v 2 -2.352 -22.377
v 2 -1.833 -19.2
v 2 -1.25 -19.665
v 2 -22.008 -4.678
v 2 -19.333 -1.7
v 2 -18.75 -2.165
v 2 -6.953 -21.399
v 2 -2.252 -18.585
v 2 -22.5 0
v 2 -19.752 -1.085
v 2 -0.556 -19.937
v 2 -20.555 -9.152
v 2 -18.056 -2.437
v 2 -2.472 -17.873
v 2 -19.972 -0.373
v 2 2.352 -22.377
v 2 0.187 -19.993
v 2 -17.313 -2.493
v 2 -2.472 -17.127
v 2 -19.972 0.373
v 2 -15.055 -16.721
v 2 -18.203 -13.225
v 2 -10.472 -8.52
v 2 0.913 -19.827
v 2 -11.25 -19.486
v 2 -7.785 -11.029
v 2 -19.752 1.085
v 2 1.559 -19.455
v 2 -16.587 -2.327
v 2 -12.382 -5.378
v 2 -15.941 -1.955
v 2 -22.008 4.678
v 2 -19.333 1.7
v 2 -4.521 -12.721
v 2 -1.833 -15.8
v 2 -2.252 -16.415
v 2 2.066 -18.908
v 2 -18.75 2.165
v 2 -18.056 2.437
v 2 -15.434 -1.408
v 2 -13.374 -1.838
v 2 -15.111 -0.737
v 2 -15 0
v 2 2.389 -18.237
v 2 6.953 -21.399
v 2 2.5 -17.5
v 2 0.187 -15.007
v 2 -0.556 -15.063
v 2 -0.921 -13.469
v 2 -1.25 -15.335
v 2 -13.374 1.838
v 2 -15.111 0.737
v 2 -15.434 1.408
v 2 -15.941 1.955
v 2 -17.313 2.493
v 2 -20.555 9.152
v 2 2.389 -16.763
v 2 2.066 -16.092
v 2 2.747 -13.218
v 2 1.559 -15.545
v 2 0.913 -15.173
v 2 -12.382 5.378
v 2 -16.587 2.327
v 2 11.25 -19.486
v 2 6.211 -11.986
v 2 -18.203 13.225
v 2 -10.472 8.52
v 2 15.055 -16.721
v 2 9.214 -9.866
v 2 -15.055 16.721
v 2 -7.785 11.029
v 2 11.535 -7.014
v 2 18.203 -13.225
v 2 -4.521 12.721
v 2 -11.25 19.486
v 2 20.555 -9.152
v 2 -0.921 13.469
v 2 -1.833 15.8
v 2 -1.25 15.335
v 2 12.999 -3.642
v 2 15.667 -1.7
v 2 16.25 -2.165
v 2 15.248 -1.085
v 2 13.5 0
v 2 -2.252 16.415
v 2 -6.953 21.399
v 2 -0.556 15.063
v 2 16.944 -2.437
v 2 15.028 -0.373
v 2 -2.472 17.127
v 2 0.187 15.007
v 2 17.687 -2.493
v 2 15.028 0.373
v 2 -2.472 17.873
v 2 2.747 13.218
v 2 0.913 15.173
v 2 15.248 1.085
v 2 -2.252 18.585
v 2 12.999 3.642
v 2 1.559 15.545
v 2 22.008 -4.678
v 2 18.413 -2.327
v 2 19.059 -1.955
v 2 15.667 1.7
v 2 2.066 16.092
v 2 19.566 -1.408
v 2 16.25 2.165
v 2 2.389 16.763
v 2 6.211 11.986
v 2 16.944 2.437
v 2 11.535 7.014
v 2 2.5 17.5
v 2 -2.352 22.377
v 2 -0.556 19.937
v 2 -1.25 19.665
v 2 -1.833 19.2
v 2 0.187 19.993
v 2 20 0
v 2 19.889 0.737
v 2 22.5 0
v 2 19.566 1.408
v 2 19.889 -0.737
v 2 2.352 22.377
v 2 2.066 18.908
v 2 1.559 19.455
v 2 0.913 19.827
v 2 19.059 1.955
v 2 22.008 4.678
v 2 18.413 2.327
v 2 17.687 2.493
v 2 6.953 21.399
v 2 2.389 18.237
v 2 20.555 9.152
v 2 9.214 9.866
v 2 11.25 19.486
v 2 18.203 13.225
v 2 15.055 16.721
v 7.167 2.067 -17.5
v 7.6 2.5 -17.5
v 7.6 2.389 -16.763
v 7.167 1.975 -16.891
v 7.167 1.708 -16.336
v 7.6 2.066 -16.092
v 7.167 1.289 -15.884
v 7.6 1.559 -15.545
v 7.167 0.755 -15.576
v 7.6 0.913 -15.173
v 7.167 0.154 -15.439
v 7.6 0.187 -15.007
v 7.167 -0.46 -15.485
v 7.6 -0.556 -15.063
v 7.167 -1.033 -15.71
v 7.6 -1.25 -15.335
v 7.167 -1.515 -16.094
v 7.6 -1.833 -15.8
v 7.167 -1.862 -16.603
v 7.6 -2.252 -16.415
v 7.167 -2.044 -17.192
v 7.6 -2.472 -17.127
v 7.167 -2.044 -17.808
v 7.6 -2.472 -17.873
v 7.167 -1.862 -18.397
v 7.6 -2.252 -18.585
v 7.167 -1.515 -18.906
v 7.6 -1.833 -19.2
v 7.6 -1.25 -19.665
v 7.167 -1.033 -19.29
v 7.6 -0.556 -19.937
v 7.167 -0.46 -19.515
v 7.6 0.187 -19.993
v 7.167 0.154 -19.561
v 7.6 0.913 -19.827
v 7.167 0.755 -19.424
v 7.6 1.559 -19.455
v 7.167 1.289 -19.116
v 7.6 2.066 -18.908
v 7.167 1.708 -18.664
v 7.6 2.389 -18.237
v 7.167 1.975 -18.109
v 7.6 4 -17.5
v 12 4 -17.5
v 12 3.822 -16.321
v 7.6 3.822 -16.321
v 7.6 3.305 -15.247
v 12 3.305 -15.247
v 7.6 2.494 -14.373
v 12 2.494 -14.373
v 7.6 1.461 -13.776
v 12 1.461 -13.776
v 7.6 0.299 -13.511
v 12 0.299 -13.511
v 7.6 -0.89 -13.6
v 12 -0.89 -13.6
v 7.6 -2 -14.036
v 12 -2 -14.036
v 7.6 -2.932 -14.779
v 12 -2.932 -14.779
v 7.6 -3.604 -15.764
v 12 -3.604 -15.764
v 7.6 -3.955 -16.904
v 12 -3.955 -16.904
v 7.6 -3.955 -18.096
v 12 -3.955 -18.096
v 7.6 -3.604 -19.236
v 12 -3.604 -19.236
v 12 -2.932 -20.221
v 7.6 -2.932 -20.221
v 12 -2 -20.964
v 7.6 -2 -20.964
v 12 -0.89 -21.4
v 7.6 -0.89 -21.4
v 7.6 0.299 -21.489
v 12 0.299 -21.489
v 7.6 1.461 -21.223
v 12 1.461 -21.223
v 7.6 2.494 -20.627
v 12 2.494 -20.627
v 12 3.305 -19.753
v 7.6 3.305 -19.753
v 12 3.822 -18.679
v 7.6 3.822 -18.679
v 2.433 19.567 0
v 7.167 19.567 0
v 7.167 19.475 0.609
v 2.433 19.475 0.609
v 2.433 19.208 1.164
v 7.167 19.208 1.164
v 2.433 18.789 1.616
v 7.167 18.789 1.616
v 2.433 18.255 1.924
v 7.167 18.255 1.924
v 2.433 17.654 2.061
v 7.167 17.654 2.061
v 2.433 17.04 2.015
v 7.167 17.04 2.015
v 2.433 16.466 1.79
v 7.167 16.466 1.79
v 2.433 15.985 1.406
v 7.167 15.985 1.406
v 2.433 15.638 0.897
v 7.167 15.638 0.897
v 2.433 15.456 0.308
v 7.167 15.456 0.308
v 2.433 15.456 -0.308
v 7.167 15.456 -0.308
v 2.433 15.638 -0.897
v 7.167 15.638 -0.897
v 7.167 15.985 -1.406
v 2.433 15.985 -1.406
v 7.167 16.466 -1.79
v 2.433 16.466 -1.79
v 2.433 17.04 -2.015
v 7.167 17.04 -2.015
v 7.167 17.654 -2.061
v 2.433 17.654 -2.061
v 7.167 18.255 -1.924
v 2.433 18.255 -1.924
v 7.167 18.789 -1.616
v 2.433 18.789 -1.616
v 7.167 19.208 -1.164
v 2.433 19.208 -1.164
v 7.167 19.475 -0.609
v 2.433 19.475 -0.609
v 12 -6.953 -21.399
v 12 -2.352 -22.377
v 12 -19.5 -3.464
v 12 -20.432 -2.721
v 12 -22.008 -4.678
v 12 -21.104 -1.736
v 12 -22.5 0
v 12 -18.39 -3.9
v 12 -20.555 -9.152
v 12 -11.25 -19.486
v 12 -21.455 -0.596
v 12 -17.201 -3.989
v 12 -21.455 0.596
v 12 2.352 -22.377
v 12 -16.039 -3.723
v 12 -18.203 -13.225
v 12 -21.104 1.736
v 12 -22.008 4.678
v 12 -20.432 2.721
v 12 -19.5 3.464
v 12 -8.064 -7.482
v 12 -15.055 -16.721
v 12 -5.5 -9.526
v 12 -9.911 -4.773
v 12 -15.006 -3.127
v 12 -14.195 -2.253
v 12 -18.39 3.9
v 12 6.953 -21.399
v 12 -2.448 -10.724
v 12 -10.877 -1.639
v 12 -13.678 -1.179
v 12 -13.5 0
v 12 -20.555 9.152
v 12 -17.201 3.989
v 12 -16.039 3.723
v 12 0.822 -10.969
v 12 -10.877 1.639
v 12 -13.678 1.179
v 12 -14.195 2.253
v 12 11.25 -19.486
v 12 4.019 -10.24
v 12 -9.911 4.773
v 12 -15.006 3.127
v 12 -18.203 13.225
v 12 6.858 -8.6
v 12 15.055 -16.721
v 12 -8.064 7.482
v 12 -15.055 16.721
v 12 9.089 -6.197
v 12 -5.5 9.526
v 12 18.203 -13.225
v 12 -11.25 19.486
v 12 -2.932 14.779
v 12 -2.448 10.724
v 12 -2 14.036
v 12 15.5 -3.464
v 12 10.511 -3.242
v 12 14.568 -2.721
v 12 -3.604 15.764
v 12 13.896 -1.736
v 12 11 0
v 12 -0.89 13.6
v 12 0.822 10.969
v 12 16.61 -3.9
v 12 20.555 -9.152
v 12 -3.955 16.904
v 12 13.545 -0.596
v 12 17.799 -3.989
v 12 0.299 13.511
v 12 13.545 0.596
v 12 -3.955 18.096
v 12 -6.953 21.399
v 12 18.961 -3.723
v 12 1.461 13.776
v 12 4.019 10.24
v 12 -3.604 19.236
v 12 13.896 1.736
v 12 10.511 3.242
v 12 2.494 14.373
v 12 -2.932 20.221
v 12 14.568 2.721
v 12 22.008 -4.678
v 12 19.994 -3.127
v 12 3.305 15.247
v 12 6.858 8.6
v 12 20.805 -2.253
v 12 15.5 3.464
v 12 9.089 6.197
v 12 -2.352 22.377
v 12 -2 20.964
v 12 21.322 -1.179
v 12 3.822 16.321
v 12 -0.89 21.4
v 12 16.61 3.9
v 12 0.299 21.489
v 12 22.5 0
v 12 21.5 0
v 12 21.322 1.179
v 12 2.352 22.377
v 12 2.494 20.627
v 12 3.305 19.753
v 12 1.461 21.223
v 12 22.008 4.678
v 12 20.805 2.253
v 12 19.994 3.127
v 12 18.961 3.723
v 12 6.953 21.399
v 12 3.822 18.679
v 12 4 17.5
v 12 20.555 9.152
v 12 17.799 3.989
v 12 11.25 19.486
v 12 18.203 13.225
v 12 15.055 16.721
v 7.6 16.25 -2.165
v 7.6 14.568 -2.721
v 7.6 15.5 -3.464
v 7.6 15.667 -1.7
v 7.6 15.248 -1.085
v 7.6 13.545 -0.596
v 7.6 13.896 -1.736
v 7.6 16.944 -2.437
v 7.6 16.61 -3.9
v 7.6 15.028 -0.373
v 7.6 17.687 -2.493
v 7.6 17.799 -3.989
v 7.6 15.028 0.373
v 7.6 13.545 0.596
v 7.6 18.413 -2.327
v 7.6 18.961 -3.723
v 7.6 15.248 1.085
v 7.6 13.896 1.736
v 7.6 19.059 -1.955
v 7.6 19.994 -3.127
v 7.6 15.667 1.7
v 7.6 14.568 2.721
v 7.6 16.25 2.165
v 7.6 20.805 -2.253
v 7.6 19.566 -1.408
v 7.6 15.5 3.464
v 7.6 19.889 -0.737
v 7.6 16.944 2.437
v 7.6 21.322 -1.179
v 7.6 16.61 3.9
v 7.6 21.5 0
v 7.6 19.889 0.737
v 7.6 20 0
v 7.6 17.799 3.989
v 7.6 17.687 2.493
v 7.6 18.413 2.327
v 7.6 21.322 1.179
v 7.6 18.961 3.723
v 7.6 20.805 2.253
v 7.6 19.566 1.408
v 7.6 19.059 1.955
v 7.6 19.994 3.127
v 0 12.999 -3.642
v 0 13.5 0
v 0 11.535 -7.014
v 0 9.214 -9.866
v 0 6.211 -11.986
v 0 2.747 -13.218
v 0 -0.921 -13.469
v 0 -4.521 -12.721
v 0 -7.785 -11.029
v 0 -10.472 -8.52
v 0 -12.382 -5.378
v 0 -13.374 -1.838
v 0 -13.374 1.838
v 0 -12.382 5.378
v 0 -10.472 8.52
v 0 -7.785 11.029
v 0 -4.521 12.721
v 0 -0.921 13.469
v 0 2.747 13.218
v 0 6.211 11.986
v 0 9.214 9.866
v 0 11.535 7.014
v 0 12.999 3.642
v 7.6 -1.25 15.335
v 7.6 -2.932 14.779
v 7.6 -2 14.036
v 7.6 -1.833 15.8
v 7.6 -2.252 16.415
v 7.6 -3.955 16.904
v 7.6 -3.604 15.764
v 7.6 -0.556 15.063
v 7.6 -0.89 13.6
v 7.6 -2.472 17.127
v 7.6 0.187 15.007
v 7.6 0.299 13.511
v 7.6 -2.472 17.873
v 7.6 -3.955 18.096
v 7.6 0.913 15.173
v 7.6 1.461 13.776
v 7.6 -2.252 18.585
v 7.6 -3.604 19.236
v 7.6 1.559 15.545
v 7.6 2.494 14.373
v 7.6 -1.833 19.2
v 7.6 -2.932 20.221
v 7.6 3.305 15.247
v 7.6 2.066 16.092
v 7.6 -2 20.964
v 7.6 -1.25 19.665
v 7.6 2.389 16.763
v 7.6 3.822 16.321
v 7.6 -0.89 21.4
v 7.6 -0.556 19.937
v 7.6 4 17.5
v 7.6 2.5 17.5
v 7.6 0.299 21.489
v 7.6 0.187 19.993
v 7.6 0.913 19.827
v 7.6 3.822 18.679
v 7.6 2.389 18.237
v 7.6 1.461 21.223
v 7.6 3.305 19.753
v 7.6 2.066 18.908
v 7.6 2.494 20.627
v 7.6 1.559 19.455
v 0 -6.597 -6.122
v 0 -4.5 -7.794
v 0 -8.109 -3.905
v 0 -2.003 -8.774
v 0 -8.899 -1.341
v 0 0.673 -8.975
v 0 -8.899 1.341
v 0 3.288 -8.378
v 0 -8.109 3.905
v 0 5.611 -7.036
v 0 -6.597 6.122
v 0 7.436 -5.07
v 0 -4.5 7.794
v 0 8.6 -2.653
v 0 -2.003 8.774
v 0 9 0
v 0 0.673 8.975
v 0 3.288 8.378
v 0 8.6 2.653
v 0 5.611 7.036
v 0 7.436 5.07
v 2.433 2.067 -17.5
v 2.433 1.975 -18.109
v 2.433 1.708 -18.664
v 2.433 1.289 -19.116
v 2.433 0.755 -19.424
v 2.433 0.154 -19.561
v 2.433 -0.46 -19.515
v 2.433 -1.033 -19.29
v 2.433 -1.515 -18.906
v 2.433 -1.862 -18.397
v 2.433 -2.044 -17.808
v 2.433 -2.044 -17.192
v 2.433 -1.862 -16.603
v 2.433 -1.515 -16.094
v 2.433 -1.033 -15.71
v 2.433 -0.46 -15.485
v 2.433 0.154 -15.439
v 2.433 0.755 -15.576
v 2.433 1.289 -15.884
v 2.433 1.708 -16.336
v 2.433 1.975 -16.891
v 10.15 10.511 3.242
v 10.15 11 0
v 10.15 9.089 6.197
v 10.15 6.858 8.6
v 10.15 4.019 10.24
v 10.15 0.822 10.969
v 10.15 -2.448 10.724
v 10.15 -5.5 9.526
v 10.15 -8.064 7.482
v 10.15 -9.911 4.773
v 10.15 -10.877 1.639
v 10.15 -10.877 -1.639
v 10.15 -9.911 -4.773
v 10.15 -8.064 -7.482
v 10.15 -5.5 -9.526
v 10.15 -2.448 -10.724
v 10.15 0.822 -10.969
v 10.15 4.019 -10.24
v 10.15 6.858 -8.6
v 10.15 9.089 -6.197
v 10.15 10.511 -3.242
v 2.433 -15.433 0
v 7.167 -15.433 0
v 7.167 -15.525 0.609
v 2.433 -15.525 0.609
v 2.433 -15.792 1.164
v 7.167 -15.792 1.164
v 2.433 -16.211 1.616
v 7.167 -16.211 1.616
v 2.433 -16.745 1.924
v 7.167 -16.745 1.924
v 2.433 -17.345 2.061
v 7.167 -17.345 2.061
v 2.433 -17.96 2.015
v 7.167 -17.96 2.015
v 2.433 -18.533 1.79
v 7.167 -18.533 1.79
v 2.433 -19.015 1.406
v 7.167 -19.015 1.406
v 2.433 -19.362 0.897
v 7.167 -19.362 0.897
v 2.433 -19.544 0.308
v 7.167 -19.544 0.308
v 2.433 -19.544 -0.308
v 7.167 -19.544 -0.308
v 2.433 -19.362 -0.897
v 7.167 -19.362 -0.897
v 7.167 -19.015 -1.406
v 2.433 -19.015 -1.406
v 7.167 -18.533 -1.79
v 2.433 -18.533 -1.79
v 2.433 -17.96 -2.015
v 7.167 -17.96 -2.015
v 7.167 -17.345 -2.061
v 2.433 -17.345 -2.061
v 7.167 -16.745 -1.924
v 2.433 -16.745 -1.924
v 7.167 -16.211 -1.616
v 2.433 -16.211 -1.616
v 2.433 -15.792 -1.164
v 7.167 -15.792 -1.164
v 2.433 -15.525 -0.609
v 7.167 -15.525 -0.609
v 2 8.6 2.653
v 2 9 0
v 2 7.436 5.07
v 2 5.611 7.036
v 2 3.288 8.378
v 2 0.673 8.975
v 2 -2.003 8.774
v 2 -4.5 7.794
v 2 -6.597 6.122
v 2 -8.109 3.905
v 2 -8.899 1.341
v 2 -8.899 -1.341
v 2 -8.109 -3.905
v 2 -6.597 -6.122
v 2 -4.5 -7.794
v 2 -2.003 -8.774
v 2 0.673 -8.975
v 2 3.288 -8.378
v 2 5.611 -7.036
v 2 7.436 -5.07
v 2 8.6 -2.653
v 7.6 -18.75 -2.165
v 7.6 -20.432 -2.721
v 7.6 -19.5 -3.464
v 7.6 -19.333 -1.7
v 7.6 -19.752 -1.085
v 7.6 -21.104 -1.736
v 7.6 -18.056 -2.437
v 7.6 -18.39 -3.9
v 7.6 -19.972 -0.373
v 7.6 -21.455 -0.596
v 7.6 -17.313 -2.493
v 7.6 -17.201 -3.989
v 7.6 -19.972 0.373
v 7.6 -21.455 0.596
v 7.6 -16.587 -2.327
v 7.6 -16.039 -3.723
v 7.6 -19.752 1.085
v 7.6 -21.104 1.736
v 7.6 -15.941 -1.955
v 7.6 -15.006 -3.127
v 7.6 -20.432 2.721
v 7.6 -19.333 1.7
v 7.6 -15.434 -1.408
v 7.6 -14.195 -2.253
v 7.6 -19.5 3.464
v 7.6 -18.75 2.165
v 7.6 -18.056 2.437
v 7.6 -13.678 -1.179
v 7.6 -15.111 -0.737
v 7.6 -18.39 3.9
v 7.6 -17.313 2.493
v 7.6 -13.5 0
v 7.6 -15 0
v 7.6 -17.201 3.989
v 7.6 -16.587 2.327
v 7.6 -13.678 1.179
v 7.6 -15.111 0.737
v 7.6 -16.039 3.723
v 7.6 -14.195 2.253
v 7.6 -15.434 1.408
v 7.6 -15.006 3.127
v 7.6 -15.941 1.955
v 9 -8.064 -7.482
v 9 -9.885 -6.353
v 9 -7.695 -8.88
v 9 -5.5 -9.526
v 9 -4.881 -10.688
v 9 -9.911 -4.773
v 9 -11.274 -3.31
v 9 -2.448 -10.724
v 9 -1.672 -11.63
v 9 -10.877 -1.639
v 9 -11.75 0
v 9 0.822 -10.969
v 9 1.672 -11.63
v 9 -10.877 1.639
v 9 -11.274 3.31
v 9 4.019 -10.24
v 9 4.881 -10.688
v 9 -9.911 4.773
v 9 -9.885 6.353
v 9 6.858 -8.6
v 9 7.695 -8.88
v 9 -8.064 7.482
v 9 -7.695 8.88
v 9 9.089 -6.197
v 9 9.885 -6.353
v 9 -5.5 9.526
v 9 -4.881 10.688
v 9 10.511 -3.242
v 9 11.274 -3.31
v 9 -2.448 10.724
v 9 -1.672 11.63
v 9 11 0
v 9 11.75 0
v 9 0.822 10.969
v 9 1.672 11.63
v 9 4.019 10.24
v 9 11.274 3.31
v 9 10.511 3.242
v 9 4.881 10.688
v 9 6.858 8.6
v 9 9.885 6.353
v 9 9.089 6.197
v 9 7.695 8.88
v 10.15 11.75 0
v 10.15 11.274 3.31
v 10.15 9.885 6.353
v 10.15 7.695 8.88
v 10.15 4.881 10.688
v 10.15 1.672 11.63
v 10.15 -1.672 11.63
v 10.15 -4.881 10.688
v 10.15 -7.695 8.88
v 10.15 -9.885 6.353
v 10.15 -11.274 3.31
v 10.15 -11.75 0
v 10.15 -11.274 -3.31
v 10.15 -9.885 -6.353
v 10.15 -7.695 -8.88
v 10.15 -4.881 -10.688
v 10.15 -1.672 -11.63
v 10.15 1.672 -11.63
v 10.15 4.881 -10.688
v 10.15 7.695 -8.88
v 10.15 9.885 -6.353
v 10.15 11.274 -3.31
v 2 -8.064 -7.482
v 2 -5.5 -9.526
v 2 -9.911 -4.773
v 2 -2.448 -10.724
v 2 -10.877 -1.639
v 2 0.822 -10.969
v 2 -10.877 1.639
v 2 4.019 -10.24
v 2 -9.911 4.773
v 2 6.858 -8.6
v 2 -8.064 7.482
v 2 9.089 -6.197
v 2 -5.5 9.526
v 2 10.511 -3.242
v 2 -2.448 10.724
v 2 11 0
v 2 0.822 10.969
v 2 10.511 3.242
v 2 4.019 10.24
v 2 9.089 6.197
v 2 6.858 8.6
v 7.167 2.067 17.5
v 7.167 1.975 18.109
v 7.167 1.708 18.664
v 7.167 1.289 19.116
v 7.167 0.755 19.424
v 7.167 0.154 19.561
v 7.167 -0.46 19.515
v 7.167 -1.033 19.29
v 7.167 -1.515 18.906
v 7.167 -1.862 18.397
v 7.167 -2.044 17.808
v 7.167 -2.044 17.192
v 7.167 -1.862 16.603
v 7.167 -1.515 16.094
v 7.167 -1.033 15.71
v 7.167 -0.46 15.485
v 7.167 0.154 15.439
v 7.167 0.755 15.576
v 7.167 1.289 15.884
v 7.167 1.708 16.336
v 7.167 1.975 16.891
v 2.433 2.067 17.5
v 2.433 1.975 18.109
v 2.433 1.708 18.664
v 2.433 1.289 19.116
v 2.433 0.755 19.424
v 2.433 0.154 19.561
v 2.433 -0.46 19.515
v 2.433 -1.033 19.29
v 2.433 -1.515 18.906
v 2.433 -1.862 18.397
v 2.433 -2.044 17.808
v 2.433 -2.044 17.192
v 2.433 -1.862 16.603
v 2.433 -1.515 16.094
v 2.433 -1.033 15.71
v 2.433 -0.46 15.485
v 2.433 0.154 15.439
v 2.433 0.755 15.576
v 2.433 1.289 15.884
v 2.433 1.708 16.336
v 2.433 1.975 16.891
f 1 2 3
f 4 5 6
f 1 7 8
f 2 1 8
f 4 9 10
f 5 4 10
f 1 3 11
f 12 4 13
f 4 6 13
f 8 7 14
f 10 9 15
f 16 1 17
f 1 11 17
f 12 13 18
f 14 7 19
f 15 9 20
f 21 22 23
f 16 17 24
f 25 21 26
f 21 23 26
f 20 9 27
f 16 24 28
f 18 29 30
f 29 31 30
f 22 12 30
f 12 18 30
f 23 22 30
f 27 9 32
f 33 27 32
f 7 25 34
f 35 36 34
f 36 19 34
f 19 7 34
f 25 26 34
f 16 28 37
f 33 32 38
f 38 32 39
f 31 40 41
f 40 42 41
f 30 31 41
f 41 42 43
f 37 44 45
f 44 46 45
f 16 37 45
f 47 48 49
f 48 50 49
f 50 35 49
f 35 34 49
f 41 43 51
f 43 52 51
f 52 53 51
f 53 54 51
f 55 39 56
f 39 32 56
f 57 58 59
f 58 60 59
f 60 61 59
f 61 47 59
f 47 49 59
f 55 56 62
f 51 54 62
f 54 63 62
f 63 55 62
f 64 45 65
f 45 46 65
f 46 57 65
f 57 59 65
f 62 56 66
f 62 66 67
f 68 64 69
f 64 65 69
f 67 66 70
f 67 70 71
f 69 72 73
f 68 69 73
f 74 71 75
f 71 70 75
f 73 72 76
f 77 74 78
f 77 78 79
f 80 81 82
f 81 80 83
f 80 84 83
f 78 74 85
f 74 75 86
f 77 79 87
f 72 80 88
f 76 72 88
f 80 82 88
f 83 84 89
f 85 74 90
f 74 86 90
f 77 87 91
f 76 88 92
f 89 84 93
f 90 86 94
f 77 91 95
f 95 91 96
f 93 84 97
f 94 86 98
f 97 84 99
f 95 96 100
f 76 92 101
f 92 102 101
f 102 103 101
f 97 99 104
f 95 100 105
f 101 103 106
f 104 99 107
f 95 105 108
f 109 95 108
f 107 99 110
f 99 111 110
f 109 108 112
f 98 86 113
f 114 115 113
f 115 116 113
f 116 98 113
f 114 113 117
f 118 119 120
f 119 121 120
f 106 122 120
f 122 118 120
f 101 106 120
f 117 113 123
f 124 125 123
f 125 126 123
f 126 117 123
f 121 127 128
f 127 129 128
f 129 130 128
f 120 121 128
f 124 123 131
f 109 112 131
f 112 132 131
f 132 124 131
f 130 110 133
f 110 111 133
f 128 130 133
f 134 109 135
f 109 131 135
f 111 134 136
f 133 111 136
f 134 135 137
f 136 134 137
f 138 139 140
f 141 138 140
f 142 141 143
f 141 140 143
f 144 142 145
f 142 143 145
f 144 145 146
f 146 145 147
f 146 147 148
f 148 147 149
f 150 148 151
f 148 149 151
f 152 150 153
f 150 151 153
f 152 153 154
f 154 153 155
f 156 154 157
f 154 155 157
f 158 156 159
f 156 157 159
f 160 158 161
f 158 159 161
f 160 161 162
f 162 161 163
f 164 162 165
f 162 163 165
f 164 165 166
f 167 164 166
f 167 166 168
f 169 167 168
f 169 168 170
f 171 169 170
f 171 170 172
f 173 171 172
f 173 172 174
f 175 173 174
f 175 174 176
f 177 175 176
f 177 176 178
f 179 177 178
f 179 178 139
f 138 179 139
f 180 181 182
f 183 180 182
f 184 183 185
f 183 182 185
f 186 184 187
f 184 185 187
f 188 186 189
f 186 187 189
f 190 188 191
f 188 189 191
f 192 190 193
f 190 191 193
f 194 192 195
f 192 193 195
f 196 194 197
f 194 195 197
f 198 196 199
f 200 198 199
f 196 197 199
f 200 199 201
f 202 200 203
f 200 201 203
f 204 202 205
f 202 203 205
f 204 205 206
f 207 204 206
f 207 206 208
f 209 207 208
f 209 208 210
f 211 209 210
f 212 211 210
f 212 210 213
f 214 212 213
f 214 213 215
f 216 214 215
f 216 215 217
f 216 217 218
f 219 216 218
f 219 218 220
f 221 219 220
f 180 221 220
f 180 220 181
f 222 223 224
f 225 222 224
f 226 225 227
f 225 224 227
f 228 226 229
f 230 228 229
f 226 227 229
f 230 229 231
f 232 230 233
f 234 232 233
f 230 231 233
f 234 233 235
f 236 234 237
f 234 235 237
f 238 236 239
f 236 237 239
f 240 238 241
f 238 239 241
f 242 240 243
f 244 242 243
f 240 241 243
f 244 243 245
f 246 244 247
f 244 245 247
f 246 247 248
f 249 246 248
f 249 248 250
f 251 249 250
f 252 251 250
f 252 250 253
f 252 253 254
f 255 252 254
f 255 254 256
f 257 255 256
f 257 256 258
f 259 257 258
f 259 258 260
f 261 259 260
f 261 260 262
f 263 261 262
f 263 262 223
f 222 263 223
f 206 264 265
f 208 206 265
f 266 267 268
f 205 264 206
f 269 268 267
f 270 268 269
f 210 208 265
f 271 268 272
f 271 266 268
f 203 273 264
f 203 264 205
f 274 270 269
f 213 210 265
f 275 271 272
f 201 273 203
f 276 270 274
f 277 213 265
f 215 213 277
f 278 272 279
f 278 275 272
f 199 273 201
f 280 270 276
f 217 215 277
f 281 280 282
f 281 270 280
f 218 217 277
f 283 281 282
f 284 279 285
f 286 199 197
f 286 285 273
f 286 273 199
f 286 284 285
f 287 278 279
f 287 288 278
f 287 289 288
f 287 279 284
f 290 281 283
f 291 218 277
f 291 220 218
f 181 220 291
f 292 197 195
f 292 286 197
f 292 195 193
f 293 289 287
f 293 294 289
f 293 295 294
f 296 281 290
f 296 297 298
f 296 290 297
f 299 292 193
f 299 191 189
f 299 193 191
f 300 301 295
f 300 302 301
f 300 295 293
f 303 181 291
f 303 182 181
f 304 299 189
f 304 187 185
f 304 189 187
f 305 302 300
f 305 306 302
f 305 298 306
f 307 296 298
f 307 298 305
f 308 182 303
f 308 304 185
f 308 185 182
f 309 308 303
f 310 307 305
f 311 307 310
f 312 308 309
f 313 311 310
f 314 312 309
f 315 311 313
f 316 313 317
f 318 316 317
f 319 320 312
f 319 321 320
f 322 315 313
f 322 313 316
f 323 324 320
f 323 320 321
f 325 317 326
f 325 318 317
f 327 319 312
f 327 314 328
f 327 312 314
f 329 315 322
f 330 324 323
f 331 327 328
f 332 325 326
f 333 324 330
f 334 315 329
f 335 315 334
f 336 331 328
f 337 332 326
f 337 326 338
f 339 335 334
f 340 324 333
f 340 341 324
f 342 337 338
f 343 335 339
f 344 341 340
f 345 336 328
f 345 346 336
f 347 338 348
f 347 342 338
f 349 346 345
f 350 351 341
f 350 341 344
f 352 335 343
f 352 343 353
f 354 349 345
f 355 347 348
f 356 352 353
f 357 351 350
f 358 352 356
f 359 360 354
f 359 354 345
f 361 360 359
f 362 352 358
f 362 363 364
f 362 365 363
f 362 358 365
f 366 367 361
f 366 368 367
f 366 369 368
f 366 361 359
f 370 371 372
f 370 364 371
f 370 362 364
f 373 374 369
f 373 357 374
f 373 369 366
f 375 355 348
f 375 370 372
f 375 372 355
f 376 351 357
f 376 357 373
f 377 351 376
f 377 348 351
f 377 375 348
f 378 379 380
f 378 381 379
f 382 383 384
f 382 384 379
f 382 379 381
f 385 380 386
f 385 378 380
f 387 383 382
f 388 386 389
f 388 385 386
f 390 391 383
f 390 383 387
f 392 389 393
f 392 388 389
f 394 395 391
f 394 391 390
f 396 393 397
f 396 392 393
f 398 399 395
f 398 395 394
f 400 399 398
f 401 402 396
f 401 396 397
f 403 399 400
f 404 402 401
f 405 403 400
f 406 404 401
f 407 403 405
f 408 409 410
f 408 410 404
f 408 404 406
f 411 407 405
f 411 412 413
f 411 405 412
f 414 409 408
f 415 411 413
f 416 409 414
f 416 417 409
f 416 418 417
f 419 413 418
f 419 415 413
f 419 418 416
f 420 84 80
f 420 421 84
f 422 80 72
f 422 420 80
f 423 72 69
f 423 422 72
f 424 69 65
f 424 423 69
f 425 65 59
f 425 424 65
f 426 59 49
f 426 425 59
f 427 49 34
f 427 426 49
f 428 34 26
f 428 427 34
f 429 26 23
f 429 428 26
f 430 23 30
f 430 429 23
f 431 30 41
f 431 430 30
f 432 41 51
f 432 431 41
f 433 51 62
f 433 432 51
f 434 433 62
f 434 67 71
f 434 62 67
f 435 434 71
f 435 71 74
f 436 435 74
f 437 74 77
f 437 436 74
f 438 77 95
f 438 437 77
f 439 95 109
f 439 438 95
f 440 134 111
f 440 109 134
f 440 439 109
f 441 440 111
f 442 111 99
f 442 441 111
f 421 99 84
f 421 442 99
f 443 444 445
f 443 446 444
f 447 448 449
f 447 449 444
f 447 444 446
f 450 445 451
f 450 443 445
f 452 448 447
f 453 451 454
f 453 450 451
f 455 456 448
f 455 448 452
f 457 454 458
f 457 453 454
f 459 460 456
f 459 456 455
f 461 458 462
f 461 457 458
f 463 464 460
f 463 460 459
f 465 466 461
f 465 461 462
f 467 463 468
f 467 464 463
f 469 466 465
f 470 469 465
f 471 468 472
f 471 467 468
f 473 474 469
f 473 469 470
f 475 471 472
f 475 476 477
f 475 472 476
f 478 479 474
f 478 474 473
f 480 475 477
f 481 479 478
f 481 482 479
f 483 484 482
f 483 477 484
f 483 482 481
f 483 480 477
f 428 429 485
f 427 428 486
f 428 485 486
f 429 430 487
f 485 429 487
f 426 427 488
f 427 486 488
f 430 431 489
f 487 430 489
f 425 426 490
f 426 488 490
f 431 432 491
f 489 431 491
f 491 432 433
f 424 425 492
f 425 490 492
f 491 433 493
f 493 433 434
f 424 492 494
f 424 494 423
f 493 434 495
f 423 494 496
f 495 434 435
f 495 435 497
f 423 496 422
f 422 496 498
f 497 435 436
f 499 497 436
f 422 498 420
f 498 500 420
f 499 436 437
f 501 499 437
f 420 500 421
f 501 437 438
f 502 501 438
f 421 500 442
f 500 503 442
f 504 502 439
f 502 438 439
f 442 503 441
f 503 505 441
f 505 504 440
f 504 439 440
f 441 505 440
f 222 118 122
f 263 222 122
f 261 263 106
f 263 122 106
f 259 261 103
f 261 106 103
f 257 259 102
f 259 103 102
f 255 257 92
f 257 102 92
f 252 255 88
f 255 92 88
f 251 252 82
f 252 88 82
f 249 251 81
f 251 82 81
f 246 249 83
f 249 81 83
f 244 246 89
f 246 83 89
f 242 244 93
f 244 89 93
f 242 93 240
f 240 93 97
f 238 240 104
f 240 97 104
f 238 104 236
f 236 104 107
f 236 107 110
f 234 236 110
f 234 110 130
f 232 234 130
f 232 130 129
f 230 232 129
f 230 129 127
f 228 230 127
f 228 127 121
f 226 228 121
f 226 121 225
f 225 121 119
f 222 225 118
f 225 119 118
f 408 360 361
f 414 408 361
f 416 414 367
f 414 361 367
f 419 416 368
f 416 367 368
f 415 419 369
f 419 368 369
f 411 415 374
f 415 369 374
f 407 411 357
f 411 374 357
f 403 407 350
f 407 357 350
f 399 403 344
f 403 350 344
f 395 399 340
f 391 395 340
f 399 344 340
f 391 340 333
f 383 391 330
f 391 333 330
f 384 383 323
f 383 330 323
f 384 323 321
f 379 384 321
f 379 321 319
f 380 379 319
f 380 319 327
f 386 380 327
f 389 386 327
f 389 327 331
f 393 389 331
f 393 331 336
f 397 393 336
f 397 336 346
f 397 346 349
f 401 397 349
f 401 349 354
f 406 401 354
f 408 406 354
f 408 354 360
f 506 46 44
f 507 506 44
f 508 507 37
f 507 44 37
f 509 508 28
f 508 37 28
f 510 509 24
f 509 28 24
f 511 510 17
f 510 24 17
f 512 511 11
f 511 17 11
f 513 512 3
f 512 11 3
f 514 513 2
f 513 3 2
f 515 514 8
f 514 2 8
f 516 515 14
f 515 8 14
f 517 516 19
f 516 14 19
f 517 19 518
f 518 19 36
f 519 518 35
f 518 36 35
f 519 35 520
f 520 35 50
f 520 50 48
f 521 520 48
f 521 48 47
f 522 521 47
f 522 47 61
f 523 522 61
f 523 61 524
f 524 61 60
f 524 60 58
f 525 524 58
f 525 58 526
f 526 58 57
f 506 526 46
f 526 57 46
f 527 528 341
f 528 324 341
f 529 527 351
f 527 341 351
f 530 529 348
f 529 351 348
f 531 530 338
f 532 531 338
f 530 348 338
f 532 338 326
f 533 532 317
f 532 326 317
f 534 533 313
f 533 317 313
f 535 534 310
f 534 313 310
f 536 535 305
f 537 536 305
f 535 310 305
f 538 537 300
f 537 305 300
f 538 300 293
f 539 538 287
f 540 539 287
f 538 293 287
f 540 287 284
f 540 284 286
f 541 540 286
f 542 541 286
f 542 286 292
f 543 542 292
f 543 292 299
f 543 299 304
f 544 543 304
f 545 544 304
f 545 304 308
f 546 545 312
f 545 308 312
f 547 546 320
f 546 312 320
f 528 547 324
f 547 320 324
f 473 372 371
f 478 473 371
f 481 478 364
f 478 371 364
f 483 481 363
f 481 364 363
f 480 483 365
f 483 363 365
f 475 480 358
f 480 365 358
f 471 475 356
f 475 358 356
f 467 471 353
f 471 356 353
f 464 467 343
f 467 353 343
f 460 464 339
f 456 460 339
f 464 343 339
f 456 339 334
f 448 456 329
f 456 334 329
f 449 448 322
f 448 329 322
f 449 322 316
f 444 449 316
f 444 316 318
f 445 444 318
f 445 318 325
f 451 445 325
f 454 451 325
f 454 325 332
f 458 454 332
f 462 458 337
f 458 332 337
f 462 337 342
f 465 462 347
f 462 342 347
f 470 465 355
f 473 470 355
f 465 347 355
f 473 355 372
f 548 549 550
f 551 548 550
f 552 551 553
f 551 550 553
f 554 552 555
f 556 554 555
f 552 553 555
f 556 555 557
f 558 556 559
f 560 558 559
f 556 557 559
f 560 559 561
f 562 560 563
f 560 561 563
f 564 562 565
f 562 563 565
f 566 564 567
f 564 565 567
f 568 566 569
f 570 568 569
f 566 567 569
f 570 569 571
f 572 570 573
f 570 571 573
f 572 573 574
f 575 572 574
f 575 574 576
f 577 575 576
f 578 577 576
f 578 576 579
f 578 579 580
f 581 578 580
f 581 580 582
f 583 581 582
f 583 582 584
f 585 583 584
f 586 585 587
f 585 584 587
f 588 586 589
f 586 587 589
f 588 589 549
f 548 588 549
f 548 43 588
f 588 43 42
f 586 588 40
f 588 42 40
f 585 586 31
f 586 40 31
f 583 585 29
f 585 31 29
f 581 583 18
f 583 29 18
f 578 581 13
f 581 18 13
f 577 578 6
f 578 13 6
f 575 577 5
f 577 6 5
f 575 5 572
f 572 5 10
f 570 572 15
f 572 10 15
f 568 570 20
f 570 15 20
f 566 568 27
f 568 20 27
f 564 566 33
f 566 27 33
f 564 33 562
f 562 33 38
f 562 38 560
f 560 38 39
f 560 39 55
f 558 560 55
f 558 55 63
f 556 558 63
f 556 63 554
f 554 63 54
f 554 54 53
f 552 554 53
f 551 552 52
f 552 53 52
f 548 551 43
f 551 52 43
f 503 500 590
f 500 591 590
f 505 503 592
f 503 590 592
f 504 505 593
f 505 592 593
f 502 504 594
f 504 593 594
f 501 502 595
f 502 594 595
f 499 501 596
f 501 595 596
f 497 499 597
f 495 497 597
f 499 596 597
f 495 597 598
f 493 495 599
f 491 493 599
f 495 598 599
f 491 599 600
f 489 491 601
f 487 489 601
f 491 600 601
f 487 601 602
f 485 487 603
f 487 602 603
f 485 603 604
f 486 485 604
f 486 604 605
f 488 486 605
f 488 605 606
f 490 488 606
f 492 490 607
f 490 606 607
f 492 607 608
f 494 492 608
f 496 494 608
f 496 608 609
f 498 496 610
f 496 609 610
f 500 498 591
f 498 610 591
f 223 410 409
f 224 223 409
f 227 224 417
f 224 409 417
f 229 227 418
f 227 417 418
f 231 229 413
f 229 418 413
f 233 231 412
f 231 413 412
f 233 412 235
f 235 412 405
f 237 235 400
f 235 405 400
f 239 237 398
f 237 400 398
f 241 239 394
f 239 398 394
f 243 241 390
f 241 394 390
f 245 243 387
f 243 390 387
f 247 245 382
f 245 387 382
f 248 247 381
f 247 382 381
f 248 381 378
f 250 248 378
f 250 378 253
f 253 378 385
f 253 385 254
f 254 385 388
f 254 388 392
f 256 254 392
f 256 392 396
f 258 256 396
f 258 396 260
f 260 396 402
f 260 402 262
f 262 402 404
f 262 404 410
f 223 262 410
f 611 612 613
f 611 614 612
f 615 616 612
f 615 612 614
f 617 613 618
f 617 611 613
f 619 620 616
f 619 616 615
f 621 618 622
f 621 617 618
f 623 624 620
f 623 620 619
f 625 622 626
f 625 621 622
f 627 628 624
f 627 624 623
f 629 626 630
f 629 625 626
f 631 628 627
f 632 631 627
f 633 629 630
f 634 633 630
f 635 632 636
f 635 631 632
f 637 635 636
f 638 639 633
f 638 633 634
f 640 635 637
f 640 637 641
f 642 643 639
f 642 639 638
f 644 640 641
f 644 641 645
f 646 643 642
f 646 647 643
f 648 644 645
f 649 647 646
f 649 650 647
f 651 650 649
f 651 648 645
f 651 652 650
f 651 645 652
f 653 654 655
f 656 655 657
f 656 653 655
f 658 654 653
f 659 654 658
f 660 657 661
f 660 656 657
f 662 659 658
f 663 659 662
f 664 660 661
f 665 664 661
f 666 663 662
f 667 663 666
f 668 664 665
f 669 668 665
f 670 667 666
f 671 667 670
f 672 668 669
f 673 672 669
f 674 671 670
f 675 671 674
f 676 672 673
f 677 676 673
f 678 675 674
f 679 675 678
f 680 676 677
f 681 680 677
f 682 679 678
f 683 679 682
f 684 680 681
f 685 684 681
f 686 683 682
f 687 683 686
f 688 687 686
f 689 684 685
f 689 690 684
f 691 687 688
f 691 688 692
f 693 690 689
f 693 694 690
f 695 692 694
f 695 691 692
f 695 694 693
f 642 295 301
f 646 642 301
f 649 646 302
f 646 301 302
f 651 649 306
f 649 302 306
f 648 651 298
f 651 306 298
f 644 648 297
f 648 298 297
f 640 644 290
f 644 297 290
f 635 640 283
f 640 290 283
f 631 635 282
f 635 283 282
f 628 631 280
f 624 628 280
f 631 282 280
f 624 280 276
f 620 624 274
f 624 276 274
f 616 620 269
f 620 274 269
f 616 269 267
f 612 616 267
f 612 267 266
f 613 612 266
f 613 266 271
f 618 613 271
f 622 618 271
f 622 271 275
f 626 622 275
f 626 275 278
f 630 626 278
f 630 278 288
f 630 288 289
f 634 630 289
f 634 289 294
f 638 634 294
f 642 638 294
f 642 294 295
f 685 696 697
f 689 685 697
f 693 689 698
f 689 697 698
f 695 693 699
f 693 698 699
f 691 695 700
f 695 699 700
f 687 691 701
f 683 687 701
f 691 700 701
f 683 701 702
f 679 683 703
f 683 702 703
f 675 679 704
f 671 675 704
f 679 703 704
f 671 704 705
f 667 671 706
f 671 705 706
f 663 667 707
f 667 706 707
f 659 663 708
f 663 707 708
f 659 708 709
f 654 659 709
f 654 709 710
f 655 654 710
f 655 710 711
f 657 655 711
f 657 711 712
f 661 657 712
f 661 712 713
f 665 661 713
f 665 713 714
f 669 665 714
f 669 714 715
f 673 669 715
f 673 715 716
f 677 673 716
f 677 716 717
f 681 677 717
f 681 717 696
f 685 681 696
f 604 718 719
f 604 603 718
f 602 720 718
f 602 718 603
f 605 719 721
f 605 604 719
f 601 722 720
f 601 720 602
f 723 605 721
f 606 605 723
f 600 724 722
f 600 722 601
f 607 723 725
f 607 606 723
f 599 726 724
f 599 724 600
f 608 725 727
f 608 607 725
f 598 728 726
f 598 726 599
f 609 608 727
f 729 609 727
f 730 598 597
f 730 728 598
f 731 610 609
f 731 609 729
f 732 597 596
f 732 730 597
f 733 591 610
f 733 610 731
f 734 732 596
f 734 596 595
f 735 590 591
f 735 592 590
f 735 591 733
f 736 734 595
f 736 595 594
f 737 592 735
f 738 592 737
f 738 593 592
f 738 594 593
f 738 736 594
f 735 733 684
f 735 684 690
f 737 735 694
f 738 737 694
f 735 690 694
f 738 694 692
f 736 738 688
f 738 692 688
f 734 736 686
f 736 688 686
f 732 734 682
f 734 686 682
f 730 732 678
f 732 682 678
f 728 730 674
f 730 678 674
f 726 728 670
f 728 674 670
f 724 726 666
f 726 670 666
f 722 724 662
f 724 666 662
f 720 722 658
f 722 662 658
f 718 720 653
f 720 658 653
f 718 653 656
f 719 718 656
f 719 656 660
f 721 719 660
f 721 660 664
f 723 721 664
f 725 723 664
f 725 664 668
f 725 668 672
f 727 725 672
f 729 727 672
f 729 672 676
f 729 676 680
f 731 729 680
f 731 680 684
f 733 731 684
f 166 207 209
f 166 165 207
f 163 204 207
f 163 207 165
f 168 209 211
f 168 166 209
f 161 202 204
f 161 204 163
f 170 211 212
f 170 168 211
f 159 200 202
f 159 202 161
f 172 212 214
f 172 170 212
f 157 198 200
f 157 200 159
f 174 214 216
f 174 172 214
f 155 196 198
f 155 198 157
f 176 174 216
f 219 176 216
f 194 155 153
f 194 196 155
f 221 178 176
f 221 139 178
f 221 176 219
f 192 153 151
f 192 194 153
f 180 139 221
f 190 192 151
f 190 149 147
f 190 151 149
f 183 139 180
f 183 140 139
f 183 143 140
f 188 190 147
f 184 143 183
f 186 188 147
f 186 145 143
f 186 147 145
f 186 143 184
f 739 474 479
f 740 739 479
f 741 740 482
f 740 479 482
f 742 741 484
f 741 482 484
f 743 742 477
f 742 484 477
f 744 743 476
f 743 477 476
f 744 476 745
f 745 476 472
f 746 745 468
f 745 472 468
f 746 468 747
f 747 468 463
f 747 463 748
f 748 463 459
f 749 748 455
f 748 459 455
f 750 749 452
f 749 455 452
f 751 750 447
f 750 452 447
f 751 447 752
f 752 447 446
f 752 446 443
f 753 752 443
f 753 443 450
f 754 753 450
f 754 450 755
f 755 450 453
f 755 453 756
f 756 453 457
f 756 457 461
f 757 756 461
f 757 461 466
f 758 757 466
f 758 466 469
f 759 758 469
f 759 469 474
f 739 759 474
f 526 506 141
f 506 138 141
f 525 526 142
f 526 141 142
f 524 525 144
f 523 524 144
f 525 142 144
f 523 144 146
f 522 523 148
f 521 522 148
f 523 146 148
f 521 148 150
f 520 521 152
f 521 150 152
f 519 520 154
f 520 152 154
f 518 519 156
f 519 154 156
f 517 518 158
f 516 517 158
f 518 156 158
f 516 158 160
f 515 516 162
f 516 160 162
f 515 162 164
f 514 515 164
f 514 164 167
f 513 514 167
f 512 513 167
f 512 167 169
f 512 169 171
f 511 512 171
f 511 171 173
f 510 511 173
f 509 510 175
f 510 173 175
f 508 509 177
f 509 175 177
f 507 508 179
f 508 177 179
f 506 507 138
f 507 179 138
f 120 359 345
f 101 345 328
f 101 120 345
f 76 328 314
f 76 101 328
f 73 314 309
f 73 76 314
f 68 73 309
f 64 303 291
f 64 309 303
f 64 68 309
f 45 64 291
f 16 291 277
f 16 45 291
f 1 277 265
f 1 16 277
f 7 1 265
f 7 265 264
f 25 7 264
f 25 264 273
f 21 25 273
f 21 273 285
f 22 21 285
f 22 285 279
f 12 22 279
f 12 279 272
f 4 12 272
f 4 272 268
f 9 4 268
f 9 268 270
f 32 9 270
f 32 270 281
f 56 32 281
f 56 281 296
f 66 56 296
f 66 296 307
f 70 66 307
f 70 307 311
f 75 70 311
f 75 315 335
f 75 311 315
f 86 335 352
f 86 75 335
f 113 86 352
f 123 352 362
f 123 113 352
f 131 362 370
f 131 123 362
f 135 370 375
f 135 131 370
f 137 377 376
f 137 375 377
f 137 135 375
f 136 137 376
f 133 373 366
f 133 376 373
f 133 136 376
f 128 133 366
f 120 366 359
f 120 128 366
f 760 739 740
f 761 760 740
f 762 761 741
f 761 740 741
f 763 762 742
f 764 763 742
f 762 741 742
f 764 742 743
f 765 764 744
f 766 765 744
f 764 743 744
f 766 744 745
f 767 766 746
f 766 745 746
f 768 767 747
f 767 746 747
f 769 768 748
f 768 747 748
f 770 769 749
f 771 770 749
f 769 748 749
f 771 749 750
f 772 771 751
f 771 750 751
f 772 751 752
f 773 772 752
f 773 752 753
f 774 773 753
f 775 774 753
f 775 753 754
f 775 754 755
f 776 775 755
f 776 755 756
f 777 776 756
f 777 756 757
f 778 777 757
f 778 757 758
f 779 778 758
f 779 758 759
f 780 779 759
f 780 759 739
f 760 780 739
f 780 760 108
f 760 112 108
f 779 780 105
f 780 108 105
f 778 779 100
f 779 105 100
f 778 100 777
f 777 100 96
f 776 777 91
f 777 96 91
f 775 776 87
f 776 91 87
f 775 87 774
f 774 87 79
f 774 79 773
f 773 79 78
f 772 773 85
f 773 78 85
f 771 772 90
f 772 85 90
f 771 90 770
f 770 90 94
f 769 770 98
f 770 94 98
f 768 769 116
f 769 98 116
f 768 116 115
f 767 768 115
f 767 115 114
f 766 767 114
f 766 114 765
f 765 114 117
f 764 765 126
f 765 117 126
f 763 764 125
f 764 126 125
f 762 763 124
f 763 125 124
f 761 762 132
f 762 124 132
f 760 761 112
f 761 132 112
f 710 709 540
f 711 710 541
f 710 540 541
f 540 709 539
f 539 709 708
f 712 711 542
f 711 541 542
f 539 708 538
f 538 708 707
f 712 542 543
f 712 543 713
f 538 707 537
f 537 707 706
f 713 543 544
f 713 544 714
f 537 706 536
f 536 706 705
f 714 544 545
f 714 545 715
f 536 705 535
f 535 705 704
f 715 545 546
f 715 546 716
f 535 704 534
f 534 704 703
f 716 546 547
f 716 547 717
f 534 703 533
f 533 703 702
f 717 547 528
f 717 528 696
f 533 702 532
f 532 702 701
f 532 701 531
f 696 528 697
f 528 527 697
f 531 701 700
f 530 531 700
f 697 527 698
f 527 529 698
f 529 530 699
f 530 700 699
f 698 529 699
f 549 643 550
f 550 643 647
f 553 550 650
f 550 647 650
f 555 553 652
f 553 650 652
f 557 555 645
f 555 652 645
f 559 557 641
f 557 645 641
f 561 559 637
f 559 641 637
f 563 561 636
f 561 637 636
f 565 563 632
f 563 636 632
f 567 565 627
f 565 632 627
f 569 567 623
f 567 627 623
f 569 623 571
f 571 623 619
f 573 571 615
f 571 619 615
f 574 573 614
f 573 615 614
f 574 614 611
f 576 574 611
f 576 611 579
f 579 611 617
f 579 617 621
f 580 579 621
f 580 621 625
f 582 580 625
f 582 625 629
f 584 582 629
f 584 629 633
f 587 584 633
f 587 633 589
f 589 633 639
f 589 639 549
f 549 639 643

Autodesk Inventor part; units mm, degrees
sketch "Sketch_1" plane through (0, 0, 0) normal (1, 0, 0) x (0, 1, 0)
  circle A0 centre (0, 0) radius 22.5
extrude "Extrusion1" add sketch "Sketch_1" along normal blind 12
sketch "Sketch_2" plane through (0, 0, 0) normal (0, 0, 1) x (1, 0, 0)
  line L0 (12, 0) -> (0, 0)
  line L1 (0, 0) -> (0, 9)
  line L2 (0, 9) -> (2, 9)
  line L3 (2, 9) -> (2, 11)
  line L4 (2, 11) -> (9, 11)
  line L5 (9, 11) -> (9, 11.75)
  line L6 (9, 11.75) -> (10.15, 11.75)
  line L7 (10.15, 11.75) -> (10.15, 11)
  line L8 (10.15, 11) -> (12, 11)
  line L9 (12, 11) -> (12, 0)
  line L10 (12, 0) -> (0, 0)
revolve "Revolution1" cut sketch "Sketch_2" angle 360 about axis through (12, 0, 0) along (1, 0, 0)
sketch "Sketch_9" plane through (0, 0, 0) normal (0, 0, 1) x (1, 0, 0)
  line L0 (12, 17.5) -> (2, 17.5)
  line L1 (2, 17.5) -> (2, 20)
  line L2 (2, 20) -> (2.433, 19.567)
  line L3 (2.433, 19.567) -> (7.167, 19.567)
  line L4 (7.167, 19.567) -> (7.6, 20)
  line L5 (7.6, 20) -> (7.6, 21.5)
  line L6 (7.6, 21.5) -> (12, 21.5)
  line L7 (12, 21.5) -> (12, 17.5)
  line L8 (12, 17.5) -> (2, 17.5)
revolve "Revolution2" cut sketch "Sketch_9" angle 360 about axis through (12, 17.5, 0) along (1, 0, 0)
thread "Thread1" size "M5x0.8" class "6H" standard "ISO Metric profile" full length
sketch "Sketch_4" plane through (0, 0, 0) normal (1, 0, 0) x (0, 1, 0)
  circle A0 centre (0, 0) radius 46
  circle A1 centre (0, 0) radius 13.5
extrude "Extrusion2" cut sketch "Sketch_4" along normal blind 2
pattern_linear "Rectangular Pattern1" count 2 spacing 24.7487 along (0, -0.7071, 0.7071) count 2 spacing 24.7487 along (0, -0.7071, -0.7071) of "Revolution2"
ref_plane "bgrrb_to_rring_XY" through (9, 0, 0) normal (1, 0, 0) x (0, 0, -1)
ref_plane "bgrrb_to_rring_YZ" through (9, 0, 0) normal (0, 0, -1) x (0, 1, 0)
ref_plane "bgrrb_to_rring_ZX" through (9, 0, 0) normal (0, 1, 0) x (1, 0, 0)
ref_plane "housing_to_dummy_XY" through (0, 0, 0) normal (0, 0, 1) x (1, 0, 0)
ref_plane "housing_to_dummy_YZ" through (0, 0, 0) normal (1, 0, 0) x (0, 1, 0)
ref_plane "housing_to_dummy_ZX" through (0, 0, 0) normal (0, 1, 0) x (0, 0, 1)
ref_plane "to_bearings_1_XY" through (2, 0, 0) normal (1, 0, 0) x (0, 0, -1)
ref_plane "to_bearings_1_YZ" through (2, 0, 0) normal (0, 0, -1) x (0, 1, 0)
ref_plane "to_bearings_1_ZX" through (2, 0, 0) normal (0, 1, 0) x (1, 0, 0)
properties part number "BARR608ZZ_b"
